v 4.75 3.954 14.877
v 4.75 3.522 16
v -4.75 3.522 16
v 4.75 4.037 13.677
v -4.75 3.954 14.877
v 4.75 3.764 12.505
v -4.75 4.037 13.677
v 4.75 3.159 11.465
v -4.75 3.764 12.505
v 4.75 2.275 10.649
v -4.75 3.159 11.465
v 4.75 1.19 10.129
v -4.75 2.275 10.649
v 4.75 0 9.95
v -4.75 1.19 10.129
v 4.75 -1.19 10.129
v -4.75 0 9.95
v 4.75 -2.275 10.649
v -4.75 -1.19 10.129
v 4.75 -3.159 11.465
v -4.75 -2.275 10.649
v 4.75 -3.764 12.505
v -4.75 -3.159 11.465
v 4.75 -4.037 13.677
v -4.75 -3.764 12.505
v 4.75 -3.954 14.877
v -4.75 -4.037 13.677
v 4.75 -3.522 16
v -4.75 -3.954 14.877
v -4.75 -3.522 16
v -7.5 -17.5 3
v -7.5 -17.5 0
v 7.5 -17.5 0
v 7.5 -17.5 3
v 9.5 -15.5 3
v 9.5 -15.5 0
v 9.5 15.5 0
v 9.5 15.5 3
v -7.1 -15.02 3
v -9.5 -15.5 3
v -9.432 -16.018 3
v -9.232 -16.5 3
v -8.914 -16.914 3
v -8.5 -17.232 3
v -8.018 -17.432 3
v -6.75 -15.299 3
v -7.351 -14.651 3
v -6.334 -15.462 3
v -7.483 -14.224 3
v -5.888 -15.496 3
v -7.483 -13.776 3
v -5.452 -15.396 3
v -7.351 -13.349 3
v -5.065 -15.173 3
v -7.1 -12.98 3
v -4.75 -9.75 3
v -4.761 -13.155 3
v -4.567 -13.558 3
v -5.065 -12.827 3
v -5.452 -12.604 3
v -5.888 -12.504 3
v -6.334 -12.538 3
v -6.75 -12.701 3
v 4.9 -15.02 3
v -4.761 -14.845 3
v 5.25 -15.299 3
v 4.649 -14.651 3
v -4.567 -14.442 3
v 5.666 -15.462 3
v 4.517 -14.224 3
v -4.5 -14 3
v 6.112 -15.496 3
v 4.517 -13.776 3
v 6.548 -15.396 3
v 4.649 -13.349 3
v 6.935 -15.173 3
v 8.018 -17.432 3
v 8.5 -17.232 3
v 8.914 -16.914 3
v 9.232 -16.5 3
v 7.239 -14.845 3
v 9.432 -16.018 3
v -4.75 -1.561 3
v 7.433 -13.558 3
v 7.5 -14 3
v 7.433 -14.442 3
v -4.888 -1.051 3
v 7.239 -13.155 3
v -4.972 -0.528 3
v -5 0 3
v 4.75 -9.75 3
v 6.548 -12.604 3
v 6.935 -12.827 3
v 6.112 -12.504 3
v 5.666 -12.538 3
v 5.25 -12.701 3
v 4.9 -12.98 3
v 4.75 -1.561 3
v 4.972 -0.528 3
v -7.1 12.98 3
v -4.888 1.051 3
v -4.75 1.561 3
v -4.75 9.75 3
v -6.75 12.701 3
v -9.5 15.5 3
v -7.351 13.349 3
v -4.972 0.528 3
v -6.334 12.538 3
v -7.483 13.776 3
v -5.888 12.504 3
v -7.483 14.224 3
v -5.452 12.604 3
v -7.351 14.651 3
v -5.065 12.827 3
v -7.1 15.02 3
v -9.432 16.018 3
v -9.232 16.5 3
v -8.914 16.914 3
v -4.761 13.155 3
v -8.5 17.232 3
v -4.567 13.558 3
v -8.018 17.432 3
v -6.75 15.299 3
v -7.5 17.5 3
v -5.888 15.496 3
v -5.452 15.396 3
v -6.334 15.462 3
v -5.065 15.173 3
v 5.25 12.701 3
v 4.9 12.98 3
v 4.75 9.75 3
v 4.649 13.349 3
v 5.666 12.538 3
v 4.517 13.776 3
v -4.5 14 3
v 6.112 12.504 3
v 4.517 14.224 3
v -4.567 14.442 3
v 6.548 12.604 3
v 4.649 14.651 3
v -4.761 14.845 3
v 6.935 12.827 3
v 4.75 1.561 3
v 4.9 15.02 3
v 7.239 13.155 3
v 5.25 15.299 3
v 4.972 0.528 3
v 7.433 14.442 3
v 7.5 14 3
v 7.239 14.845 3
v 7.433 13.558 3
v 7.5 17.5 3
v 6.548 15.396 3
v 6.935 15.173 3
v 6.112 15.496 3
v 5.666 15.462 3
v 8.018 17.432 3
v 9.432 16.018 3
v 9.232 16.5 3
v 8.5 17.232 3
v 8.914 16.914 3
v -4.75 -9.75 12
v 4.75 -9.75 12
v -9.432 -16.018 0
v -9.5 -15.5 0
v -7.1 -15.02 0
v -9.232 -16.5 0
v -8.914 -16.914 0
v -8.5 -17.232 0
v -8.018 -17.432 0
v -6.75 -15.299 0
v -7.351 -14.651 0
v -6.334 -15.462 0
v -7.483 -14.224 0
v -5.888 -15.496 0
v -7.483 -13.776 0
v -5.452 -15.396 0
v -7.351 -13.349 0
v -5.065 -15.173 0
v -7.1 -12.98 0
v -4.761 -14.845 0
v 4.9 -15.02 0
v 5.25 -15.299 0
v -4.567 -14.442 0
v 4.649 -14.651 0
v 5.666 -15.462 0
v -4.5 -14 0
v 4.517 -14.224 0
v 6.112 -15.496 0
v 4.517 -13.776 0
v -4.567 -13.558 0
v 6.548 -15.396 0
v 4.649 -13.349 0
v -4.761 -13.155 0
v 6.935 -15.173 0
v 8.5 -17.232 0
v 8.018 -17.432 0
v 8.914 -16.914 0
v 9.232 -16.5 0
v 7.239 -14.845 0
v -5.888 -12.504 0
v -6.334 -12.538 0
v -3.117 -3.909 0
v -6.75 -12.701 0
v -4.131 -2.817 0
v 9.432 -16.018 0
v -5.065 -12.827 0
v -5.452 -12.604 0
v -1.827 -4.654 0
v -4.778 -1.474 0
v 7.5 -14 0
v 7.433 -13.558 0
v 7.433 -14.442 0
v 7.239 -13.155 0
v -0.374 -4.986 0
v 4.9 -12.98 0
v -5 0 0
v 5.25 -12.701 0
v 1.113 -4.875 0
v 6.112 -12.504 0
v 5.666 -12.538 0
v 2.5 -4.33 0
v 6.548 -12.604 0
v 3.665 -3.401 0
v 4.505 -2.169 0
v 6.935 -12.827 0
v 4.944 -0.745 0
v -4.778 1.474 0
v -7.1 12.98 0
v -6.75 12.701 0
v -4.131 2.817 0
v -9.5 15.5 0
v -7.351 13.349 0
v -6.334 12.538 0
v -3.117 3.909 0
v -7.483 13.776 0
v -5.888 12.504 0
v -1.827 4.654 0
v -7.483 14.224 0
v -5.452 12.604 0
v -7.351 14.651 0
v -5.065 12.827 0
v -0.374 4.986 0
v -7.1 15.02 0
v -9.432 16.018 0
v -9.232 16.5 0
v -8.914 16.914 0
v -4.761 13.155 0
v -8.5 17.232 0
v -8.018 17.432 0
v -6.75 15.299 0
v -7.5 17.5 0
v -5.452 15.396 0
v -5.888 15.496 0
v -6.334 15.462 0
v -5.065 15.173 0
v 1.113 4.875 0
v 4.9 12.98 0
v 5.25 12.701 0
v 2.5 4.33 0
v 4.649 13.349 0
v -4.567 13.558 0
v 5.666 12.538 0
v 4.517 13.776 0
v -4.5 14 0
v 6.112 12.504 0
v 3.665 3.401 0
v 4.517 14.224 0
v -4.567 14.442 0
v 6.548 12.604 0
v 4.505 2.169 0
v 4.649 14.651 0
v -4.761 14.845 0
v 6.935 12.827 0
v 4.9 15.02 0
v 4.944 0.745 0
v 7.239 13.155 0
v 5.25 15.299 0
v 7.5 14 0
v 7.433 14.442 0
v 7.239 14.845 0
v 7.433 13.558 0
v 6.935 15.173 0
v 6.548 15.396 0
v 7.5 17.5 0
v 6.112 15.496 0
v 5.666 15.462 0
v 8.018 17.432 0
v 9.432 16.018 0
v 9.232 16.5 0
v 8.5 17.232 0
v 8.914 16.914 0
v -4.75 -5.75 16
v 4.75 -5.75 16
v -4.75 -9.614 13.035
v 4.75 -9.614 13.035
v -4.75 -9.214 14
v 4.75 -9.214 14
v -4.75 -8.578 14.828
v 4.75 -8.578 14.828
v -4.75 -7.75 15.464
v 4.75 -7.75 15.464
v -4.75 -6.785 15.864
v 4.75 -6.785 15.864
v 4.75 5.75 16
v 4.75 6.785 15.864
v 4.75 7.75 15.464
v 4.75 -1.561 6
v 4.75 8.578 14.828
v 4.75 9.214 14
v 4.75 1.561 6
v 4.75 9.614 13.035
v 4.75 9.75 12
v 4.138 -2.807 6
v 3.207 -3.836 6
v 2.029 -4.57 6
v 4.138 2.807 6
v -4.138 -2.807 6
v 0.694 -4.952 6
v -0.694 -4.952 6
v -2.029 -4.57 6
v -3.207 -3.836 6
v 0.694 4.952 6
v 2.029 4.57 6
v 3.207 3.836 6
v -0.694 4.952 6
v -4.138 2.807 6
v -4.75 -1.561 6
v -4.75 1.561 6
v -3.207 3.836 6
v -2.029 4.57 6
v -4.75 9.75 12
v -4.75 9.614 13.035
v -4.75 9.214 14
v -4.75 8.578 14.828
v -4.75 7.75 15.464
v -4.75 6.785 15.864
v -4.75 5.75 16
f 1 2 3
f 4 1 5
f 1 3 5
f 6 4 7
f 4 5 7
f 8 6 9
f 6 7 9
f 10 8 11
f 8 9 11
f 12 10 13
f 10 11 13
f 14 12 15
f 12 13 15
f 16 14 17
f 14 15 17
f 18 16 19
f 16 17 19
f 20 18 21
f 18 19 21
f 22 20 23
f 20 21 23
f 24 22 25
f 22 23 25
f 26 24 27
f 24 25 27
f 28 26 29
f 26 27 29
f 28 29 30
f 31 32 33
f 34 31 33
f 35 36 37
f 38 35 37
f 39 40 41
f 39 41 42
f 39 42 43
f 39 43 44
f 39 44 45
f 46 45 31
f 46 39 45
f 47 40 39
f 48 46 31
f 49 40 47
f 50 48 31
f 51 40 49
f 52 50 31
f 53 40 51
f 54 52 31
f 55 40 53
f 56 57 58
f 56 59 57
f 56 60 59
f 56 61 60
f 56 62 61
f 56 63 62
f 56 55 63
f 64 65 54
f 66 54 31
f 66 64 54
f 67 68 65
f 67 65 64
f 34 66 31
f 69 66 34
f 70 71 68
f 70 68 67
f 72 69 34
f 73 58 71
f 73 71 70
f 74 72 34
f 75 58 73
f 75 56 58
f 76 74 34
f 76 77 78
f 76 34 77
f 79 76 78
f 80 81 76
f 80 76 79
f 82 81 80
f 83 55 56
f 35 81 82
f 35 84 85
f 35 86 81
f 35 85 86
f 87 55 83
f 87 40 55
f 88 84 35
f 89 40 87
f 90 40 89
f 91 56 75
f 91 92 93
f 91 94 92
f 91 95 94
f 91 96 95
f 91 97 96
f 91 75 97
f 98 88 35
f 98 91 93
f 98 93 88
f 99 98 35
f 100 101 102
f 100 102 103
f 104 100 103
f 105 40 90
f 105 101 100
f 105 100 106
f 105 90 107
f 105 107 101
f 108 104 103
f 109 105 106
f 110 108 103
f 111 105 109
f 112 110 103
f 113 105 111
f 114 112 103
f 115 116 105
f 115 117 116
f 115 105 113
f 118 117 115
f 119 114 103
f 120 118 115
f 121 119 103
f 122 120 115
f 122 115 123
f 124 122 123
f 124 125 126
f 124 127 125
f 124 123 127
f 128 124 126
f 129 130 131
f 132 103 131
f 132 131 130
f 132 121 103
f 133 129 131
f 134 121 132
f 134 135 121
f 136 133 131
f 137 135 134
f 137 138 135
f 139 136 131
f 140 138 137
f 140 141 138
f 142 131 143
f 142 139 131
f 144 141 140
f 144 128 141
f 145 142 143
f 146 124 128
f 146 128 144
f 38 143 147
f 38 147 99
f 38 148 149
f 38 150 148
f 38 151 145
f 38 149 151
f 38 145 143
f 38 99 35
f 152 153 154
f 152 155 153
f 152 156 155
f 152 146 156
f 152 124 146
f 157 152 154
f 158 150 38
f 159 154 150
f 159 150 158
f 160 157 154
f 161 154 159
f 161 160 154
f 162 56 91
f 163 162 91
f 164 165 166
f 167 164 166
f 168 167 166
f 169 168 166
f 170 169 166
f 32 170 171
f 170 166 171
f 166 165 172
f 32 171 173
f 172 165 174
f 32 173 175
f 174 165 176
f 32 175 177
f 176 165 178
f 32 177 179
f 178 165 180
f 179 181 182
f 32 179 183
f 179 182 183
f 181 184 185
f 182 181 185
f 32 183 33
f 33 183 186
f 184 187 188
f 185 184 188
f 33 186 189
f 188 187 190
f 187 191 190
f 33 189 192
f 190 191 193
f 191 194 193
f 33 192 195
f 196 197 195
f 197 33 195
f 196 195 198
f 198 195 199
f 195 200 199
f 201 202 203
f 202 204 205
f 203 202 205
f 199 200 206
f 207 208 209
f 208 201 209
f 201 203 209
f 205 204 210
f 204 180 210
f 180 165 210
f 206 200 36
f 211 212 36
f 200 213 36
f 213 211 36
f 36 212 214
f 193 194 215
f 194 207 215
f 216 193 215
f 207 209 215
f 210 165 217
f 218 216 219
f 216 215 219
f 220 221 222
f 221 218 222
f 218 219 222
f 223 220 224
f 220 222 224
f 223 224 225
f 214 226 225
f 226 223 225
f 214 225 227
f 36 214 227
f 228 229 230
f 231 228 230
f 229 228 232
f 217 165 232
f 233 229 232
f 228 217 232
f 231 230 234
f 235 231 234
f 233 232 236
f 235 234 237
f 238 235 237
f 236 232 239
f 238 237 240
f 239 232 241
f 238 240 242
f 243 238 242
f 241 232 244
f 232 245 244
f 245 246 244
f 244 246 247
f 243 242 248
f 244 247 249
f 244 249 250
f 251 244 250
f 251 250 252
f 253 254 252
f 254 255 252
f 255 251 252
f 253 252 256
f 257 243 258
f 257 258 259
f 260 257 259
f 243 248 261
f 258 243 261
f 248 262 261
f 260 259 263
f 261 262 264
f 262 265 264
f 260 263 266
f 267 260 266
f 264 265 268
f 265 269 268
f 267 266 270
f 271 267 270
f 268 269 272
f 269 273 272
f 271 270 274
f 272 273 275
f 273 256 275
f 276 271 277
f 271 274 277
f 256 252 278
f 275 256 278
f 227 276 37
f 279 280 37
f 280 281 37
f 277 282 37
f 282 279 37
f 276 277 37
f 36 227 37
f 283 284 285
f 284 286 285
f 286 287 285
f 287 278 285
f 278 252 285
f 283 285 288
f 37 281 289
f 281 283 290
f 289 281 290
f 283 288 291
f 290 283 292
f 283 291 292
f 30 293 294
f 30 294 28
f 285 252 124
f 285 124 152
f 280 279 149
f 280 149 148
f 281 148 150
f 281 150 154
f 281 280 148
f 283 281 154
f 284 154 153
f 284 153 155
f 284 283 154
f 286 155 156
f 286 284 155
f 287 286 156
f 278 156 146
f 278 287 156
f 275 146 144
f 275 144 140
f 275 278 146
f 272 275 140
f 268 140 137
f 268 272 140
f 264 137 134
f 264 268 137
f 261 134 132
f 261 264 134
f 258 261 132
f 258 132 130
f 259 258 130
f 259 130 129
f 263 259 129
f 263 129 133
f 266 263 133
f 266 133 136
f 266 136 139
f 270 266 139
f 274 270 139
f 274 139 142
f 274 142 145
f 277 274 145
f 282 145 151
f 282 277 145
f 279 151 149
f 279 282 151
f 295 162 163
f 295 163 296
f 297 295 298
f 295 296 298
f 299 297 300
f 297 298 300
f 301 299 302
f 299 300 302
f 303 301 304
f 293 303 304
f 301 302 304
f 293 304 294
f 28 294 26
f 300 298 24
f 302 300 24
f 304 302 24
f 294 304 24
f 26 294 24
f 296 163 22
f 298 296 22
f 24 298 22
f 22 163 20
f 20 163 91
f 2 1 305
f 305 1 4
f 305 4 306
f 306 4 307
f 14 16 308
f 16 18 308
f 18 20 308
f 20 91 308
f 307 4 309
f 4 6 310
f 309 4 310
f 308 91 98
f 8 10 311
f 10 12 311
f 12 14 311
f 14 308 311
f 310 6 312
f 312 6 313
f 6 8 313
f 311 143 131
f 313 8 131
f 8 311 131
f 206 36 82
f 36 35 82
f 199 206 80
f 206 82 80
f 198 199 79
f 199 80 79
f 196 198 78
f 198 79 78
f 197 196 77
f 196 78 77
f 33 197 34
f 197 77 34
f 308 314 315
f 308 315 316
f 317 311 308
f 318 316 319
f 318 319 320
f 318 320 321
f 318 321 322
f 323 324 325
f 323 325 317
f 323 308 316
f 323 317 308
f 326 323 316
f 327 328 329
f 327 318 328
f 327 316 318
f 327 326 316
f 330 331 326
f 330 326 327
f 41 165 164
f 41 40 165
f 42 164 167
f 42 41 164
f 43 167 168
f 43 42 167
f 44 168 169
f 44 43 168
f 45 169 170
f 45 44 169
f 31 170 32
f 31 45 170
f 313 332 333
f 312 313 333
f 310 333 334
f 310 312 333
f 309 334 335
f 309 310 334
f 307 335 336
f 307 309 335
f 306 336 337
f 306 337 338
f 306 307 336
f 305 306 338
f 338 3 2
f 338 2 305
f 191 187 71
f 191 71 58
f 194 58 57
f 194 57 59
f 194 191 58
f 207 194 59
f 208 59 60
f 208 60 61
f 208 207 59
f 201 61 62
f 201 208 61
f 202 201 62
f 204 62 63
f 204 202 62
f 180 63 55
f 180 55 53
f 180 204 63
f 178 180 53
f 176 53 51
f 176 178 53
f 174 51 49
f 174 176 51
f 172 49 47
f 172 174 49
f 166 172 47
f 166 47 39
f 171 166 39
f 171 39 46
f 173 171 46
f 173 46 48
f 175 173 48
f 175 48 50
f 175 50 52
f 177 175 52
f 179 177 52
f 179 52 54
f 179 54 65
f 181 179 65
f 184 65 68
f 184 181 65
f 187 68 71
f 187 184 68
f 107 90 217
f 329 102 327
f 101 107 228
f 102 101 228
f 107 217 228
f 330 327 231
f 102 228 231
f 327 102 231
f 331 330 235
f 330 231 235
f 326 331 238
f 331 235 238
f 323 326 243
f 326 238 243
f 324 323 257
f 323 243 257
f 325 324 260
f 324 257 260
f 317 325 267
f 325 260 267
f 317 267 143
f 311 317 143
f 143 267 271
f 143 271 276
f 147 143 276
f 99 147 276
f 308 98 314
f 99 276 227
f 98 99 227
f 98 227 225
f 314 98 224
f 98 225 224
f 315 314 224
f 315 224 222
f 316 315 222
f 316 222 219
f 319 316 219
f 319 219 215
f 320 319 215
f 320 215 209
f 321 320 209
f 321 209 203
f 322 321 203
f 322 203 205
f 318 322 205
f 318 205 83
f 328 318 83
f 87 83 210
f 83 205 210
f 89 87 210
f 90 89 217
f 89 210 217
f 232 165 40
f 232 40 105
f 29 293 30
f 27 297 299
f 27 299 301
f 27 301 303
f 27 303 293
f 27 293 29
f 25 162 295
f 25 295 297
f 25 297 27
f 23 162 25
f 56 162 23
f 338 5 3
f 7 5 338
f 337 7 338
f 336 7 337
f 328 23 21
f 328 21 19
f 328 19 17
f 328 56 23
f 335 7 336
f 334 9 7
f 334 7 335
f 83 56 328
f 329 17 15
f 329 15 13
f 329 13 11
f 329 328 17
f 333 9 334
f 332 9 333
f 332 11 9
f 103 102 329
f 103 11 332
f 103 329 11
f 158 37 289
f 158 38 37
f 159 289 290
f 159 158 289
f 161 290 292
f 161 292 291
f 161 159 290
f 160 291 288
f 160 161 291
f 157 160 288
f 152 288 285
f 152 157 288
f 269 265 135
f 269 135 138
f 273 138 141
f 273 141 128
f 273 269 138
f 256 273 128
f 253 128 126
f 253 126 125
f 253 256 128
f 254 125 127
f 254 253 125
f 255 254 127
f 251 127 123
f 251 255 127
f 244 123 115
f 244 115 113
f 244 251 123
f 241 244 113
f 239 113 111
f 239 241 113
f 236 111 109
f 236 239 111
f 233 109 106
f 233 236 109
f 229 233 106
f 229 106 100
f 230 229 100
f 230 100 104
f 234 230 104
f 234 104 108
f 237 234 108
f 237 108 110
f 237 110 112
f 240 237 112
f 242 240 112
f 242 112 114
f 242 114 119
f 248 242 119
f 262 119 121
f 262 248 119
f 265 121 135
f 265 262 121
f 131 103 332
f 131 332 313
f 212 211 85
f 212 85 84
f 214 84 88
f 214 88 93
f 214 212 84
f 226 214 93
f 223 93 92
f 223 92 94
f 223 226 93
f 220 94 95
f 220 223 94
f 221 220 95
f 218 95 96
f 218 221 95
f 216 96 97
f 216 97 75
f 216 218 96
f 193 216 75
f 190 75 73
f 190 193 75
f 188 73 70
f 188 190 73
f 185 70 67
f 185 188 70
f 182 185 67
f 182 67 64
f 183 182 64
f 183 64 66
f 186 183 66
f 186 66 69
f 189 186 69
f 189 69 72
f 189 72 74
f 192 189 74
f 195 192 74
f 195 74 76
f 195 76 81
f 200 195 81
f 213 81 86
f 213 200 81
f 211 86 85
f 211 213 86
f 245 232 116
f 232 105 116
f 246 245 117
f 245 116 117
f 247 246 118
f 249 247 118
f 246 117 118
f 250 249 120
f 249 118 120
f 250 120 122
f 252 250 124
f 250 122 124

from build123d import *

# Parameters (mm, degrees)
SKETCH_1_W          = 19
SKETCH_1_H          = 35
SKETCH_1_R          = 1.5
EXTRUDE_1_DEPTH     = 3
SKETCH_2_W          = 9.5
SKETCH_2_H          = 19.5
EXTRUDE_2_DEPTH     = 16
SKETCH_3_R          = 4.05
CUT_EXTRUDE_1_DEPTH = 16
SKETCH_4_W          = 3
SKETCH_4_H          = 19.5
CUT_EXTRUDE_2_DEPTH = 16
FILLET_1_R          = 2
SKETCH_5_R          = 5
CUT_EXTRUDE_3_DEPTH = 6
FILLET_3_R          = 4


with BuildPart() as part:
    # 草图1 → 凸台-拉伸1 (new body)
    with BuildSketch(Plane.XY):
        Rectangle(SKETCH_1_W, SKETCH_1_H)
        with Locations((-6, 14)):
            Circle(SKETCH_1_R, mode=Mode.SUBTRACT)
        with Locations((6, 14)):
            Circle(SKETCH_1_R, mode=Mode.SUBTRACT)
        with Locations((6, -14)):
            Circle(SKETCH_1_R, mode=Mode.SUBTRACT)
        with Locations((-6, -14)):
            Circle(SKETCH_1_R, mode=Mode.SUBTRACT)
    extrude(amount=EXTRUDE_1_DEPTH)

    # 草图2 → 凸台-拉伸2 (add)
    with BuildSketch(Plane.XY.offset(3)):
        Rectangle(SKETCH_2_W, SKETCH_2_H)
    extrude(amount=EXTRUDE_2_DEPTH)

    # 草图3 → 切除-拉伸1 (cut)
    with BuildSketch(Plane.ZY.offset(4.75)):
        with Locations(Location((14, 0, 0), (0, 0, 270))):
            Circle(SKETCH_3_R)
    extrude(amount=-CUT_EXTRUDE_1_DEPTH, mode=Mode.SUBTRACT)

    # 草图4 → 切除-拉伸2 (cut)
    with BuildSketch(Plane.ZY.offset(4.75)):
        with Locations((17.5, 0)):
            Rectangle(SKETCH_4_W, SKETCH_4_H)
    extrude(amount=-CUT_EXTRUDE_2_DEPTH, mode=Mode.SUBTRACT)

    # 圆角1
    fillet_1_edges = [part.edges().sort_by_distance(p)[0] for p in [
        (9.5, -17.5, 1.5),
        (-9.5, -17.5, 1.5),
        (-9.5, 17.5, 1.5),
        (9.5, 17.5, 1.5),
    ]]
    fillet(fillet_1_edges, radius=FILLET_1_R)

    # 草图5 → 切除-拉伸3 (cut)
    with BuildSketch(Plane(origin=(0, 0, 0), x_dir=(-1, 0, 0), z_dir=(0, 0, -1))):
        Circle(SKETCH_5_R)
    extrude(amount=-CUT_EXTRUDE_3_DEPTH, mode=Mode.SUBTRACT)

    # 圆角3
    fillet_3_edges = [part.edges().sort_by_distance(p)[0] for p in [
        (0, 9.75, 16),
        (0, -9.75, 16),
    ]]
    fillet(fillet_3_edges, radius=FILLET_3_R)


solid = part.part
